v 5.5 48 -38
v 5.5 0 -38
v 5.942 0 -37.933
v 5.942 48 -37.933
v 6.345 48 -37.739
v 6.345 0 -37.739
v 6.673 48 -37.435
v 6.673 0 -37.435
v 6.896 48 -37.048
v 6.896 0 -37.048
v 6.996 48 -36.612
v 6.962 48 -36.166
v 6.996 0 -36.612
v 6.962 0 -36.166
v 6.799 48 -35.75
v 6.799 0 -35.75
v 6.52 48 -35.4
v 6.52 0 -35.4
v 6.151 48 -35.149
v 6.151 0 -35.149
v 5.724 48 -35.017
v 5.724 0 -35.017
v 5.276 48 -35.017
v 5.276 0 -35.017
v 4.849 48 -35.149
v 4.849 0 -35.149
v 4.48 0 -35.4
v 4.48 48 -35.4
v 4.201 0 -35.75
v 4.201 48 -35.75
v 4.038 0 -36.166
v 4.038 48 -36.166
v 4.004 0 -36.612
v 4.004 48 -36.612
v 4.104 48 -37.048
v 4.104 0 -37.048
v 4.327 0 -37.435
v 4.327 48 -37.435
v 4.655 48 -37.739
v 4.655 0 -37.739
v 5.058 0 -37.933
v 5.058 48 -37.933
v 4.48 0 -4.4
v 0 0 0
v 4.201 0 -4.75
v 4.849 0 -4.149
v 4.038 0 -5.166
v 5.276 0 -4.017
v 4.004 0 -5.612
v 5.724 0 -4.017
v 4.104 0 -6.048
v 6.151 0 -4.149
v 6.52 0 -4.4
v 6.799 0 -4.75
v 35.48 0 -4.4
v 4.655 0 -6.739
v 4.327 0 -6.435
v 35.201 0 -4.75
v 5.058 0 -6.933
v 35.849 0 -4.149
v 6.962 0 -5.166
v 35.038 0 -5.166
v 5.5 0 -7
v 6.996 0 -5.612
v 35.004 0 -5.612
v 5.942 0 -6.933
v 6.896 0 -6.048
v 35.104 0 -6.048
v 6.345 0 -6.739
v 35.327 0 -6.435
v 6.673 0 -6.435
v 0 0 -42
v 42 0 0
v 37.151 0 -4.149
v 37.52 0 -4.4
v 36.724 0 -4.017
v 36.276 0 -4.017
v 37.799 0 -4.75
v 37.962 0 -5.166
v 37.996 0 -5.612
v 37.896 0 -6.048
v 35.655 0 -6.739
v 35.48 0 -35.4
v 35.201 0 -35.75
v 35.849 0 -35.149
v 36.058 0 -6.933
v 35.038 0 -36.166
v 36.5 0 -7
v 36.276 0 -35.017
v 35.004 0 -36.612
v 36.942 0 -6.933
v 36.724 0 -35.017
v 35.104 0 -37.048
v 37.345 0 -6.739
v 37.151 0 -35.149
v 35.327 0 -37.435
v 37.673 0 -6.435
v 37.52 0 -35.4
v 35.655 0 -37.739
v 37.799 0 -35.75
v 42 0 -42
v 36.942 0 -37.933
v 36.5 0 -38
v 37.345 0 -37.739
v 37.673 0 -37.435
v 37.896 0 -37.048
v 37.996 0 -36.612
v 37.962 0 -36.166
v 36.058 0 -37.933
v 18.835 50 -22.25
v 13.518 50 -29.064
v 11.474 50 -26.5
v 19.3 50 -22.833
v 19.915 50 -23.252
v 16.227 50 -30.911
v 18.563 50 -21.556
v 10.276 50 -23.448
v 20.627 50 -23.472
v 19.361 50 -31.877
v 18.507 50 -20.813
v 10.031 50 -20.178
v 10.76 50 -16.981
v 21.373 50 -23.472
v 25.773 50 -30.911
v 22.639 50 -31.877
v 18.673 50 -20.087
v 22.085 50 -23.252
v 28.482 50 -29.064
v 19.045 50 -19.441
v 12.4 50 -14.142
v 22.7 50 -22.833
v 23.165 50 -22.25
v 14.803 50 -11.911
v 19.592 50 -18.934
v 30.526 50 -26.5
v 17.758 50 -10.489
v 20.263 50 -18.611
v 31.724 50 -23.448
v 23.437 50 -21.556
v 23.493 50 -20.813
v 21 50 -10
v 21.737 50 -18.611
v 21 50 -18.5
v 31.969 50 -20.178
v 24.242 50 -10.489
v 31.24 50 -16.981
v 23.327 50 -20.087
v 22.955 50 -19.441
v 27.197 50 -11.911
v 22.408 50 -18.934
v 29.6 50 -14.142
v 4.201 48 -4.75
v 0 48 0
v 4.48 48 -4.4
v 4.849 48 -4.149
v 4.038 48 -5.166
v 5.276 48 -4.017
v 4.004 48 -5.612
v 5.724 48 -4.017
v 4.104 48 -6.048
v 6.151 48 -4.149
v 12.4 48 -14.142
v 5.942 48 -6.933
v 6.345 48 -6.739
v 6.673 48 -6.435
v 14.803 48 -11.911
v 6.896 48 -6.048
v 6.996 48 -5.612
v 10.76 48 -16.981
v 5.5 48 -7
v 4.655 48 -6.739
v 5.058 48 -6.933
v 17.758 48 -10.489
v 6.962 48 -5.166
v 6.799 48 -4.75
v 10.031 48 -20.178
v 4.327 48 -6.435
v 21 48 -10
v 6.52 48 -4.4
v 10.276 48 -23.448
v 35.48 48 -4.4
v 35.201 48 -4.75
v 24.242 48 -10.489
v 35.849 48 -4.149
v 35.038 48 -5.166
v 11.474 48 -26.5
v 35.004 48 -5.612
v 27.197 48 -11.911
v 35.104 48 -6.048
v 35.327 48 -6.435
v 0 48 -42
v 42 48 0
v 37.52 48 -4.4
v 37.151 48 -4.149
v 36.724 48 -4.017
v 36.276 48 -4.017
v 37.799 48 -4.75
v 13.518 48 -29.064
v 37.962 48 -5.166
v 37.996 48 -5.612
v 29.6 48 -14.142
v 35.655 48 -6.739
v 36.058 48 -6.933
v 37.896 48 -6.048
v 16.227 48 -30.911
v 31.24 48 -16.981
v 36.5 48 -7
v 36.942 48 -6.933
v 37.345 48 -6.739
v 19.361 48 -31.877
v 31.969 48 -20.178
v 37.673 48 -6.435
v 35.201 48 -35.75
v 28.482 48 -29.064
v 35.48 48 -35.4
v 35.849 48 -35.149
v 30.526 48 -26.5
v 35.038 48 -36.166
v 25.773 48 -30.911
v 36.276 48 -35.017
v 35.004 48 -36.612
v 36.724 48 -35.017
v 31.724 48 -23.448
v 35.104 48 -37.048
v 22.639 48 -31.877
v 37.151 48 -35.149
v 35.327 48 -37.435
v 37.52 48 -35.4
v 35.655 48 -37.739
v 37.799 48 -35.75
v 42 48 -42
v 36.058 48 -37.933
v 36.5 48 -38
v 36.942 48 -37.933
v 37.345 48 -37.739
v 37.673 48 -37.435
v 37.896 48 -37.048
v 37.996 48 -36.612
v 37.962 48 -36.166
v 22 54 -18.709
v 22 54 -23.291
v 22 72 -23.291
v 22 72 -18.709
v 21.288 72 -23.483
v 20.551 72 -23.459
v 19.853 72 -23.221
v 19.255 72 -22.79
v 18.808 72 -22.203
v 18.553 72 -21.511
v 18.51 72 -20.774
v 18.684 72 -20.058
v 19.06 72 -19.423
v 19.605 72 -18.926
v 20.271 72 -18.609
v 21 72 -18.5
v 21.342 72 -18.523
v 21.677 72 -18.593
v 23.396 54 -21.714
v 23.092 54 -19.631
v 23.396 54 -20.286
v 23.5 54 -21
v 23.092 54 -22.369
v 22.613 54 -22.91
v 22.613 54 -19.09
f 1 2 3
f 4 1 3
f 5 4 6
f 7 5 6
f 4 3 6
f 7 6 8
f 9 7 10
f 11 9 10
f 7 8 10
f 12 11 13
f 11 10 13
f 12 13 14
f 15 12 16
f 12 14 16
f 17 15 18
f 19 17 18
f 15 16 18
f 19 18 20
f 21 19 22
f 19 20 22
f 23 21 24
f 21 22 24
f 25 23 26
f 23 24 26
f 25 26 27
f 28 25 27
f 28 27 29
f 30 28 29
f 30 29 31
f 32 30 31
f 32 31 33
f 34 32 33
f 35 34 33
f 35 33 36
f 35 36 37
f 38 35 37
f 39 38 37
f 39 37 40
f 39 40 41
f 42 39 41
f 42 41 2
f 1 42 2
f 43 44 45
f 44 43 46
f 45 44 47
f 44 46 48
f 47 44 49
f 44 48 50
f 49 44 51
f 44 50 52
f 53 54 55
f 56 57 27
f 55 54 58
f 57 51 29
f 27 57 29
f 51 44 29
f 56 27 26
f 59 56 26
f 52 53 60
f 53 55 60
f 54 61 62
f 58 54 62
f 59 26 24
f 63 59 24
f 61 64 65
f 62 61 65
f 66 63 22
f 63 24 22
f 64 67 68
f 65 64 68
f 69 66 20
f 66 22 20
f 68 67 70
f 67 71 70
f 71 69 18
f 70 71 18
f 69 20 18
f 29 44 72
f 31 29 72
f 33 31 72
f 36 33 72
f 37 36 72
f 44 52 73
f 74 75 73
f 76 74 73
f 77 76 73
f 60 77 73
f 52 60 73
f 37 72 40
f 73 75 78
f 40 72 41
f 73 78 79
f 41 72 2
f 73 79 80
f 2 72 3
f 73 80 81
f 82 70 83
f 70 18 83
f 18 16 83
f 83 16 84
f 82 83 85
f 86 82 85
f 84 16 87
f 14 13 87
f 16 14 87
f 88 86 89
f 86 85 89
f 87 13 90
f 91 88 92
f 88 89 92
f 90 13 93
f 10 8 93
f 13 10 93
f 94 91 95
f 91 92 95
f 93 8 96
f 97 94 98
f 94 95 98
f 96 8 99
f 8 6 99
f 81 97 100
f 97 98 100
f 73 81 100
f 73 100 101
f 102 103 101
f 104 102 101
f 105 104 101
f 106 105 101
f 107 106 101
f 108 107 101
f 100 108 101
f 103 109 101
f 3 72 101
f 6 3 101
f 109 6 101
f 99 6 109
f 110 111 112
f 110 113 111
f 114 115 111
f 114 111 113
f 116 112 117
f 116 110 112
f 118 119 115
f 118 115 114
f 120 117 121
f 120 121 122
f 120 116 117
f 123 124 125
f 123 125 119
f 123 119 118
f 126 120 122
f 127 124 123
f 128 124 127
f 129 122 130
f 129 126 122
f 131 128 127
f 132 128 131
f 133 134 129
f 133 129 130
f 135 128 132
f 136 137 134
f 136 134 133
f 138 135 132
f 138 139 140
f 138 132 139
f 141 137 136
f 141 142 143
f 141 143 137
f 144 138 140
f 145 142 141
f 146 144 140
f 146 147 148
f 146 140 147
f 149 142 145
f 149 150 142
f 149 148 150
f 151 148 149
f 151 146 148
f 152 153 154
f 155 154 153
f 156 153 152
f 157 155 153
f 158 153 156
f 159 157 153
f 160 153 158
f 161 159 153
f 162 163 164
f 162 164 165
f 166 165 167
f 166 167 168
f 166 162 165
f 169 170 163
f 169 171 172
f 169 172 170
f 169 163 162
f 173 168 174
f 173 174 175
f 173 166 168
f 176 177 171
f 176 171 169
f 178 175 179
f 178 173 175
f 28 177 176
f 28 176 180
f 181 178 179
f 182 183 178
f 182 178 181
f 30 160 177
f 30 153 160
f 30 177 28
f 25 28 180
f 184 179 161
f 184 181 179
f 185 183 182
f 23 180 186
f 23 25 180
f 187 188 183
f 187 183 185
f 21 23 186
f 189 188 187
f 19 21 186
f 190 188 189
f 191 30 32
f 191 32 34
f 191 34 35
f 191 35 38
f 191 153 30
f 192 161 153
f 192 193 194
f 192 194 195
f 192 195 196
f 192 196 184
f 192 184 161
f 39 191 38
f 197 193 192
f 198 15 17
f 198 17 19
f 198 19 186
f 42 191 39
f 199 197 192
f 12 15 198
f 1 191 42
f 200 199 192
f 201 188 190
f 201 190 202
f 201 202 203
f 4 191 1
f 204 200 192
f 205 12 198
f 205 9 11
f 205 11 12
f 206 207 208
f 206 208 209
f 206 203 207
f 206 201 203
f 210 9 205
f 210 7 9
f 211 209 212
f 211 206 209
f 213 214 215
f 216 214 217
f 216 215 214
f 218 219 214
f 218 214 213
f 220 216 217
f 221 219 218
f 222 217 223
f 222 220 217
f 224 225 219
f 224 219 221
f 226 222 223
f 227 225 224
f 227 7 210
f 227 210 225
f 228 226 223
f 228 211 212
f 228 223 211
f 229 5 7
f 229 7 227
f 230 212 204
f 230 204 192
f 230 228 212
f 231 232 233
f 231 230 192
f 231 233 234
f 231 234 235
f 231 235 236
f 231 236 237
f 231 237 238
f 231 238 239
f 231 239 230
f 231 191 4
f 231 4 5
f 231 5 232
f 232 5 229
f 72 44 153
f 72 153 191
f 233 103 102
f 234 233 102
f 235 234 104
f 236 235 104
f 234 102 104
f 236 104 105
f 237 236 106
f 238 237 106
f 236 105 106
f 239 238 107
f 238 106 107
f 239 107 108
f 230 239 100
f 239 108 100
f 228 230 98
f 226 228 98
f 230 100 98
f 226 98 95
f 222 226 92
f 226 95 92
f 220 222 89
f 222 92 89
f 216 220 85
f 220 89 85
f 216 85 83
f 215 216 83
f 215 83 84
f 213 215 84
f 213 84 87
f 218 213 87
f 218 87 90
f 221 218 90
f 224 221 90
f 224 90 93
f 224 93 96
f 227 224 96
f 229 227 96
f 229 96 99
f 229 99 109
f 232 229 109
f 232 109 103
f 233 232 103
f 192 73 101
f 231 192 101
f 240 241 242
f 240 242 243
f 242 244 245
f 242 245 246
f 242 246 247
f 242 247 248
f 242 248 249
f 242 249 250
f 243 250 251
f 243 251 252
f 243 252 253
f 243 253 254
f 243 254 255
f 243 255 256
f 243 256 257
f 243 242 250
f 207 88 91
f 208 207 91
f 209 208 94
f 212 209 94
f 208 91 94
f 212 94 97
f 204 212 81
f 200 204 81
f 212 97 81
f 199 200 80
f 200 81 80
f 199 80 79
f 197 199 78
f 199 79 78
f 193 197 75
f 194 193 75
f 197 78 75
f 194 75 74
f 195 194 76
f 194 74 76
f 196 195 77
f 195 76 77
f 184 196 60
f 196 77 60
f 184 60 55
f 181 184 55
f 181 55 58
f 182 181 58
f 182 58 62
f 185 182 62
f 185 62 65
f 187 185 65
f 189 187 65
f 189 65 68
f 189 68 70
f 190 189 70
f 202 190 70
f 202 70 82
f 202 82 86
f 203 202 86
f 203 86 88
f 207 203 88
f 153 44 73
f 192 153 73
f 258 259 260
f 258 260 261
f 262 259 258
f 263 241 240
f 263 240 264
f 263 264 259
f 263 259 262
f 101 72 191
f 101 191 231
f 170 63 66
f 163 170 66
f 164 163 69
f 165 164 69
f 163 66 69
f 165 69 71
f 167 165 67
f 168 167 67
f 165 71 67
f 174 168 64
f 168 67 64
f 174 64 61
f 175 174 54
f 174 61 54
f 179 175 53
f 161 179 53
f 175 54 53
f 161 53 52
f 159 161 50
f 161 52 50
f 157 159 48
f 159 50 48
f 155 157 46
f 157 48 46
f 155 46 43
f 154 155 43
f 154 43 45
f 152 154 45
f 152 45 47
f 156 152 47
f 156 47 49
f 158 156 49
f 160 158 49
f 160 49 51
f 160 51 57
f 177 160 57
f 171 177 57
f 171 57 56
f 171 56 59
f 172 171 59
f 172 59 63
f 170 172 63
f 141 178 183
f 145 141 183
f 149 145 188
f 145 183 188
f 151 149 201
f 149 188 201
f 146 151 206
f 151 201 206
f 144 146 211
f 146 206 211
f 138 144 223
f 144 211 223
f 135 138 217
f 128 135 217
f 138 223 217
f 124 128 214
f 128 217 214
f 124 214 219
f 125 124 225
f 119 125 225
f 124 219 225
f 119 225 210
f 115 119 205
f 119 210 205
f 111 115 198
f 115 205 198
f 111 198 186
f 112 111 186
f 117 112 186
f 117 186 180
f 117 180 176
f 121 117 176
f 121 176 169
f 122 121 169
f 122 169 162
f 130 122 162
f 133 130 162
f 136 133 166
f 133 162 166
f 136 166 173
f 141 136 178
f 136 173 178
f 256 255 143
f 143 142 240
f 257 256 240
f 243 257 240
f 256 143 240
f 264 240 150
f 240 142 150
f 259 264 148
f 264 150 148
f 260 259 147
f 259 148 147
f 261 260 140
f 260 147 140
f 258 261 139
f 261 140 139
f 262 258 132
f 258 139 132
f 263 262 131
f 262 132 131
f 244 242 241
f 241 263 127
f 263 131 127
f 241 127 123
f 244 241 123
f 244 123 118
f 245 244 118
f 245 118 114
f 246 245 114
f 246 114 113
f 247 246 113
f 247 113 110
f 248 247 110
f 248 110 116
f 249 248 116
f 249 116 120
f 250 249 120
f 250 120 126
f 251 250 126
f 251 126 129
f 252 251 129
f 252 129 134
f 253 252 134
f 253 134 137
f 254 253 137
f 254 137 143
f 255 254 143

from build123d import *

# Parameters (mm, degrees)
SKETCH_1_W          = 42
SKETCH_1_H          = 42
EXTRUDE_1_DEPTH     = 48
SKETCH_2_R          = 11
EXTRUDE_2_DEPTH     = 2
SKETCH_3_R          = 1.5
CUT_EXTRUDE_1_DEPTH = 78.640195775
SKETCH_4_R          = 2.5
EXTRUDE_3_DEPTH     = 22
CUT_EXTRUDE_START   = -18
CUT_EXTRUDE_2_DEPTH = 18


with BuildPart() as part:
    # 草图1 → 凸台-拉伸1 (new body)
    with BuildSketch(Plane(origin=(0, 0, 0), x_dir=(1, 0, 0), z_dir=(0, 1, 0))):
        with Locations((21, 21)):
            Rectangle(SKETCH_1_W, SKETCH_1_H)
    extrude(amount=EXTRUDE_1_DEPTH)

    # 草图2 → 凸台-拉伸2 (add)
    with BuildSketch(Plane(origin=(0, 48, 0), x_dir=(1, 0, 0), z_dir=(0, 1, 0))):
        with Locations(Location((21, 21, 0), (0, 0, 270))):
            Circle(SKETCH_2_R)
    extrude(amount=EXTRUDE_2_DEPTH)

    # 草图3 → 切除-拉伸1 (cut, through all)
    with BuildSketch(Plane.XZ):
        with Locations(Location((36.5, -5.5, 0), (0, 0, 270))):
            Circle(SKETCH_3_R)
        with Locations(Location((5.5, -5.5, 0), (0, 0, 270))):
            Circle(SKETCH_3_R)
        with Locations(Location((5.5, -36.5, 0), (0, 0, 270))):
            Circle(SKETCH_3_R)
        with Locations(Location((36.5, -36.5, 0), (0, 0, 270))):
            Circle(SKETCH_3_R)
    extrude(amount=-CUT_EXTRUDE_1_DEPTH, mode=Mode.SUBTRACT)

    # 草图4 → 凸台-拉伸3 (add)
    with BuildSketch(Plane(origin=(0, 50, 0), x_dir=(1, 0, 0), z_dir=(0, 1, 0))):
        with Locations(Location((21, 21, 0), (0, 0, 270))):
            Circle(SKETCH_4_R)
    extrude(amount=EXTRUDE_3_DEPTH)

    # 草图5 → 切除-拉伸2 (cut)
    with BuildSketch(Plane(origin=(0, 72, 0), x_dir=(1, 0, 0), z_dir=(0, 1, 0)).offset(CUT_EXTRUDE_START)):
        with BuildLine():
            Line((22, 23.291287847), (22, 21))
            Line((22, 21), (22, 18.708712153))
            ThreePointArc((22, 18.708712153), (23.091650066, 19.630693606), (23.5, 21))
            ThreePointArc((23.5, 21), (23.091650066, 22.369306394), (22, 23.291287847))
        make_face()
    extrude(amount=CUT_EXTRUDE_2_DEPTH, mode=Mode.SUBTRACT)


solid = part.part
